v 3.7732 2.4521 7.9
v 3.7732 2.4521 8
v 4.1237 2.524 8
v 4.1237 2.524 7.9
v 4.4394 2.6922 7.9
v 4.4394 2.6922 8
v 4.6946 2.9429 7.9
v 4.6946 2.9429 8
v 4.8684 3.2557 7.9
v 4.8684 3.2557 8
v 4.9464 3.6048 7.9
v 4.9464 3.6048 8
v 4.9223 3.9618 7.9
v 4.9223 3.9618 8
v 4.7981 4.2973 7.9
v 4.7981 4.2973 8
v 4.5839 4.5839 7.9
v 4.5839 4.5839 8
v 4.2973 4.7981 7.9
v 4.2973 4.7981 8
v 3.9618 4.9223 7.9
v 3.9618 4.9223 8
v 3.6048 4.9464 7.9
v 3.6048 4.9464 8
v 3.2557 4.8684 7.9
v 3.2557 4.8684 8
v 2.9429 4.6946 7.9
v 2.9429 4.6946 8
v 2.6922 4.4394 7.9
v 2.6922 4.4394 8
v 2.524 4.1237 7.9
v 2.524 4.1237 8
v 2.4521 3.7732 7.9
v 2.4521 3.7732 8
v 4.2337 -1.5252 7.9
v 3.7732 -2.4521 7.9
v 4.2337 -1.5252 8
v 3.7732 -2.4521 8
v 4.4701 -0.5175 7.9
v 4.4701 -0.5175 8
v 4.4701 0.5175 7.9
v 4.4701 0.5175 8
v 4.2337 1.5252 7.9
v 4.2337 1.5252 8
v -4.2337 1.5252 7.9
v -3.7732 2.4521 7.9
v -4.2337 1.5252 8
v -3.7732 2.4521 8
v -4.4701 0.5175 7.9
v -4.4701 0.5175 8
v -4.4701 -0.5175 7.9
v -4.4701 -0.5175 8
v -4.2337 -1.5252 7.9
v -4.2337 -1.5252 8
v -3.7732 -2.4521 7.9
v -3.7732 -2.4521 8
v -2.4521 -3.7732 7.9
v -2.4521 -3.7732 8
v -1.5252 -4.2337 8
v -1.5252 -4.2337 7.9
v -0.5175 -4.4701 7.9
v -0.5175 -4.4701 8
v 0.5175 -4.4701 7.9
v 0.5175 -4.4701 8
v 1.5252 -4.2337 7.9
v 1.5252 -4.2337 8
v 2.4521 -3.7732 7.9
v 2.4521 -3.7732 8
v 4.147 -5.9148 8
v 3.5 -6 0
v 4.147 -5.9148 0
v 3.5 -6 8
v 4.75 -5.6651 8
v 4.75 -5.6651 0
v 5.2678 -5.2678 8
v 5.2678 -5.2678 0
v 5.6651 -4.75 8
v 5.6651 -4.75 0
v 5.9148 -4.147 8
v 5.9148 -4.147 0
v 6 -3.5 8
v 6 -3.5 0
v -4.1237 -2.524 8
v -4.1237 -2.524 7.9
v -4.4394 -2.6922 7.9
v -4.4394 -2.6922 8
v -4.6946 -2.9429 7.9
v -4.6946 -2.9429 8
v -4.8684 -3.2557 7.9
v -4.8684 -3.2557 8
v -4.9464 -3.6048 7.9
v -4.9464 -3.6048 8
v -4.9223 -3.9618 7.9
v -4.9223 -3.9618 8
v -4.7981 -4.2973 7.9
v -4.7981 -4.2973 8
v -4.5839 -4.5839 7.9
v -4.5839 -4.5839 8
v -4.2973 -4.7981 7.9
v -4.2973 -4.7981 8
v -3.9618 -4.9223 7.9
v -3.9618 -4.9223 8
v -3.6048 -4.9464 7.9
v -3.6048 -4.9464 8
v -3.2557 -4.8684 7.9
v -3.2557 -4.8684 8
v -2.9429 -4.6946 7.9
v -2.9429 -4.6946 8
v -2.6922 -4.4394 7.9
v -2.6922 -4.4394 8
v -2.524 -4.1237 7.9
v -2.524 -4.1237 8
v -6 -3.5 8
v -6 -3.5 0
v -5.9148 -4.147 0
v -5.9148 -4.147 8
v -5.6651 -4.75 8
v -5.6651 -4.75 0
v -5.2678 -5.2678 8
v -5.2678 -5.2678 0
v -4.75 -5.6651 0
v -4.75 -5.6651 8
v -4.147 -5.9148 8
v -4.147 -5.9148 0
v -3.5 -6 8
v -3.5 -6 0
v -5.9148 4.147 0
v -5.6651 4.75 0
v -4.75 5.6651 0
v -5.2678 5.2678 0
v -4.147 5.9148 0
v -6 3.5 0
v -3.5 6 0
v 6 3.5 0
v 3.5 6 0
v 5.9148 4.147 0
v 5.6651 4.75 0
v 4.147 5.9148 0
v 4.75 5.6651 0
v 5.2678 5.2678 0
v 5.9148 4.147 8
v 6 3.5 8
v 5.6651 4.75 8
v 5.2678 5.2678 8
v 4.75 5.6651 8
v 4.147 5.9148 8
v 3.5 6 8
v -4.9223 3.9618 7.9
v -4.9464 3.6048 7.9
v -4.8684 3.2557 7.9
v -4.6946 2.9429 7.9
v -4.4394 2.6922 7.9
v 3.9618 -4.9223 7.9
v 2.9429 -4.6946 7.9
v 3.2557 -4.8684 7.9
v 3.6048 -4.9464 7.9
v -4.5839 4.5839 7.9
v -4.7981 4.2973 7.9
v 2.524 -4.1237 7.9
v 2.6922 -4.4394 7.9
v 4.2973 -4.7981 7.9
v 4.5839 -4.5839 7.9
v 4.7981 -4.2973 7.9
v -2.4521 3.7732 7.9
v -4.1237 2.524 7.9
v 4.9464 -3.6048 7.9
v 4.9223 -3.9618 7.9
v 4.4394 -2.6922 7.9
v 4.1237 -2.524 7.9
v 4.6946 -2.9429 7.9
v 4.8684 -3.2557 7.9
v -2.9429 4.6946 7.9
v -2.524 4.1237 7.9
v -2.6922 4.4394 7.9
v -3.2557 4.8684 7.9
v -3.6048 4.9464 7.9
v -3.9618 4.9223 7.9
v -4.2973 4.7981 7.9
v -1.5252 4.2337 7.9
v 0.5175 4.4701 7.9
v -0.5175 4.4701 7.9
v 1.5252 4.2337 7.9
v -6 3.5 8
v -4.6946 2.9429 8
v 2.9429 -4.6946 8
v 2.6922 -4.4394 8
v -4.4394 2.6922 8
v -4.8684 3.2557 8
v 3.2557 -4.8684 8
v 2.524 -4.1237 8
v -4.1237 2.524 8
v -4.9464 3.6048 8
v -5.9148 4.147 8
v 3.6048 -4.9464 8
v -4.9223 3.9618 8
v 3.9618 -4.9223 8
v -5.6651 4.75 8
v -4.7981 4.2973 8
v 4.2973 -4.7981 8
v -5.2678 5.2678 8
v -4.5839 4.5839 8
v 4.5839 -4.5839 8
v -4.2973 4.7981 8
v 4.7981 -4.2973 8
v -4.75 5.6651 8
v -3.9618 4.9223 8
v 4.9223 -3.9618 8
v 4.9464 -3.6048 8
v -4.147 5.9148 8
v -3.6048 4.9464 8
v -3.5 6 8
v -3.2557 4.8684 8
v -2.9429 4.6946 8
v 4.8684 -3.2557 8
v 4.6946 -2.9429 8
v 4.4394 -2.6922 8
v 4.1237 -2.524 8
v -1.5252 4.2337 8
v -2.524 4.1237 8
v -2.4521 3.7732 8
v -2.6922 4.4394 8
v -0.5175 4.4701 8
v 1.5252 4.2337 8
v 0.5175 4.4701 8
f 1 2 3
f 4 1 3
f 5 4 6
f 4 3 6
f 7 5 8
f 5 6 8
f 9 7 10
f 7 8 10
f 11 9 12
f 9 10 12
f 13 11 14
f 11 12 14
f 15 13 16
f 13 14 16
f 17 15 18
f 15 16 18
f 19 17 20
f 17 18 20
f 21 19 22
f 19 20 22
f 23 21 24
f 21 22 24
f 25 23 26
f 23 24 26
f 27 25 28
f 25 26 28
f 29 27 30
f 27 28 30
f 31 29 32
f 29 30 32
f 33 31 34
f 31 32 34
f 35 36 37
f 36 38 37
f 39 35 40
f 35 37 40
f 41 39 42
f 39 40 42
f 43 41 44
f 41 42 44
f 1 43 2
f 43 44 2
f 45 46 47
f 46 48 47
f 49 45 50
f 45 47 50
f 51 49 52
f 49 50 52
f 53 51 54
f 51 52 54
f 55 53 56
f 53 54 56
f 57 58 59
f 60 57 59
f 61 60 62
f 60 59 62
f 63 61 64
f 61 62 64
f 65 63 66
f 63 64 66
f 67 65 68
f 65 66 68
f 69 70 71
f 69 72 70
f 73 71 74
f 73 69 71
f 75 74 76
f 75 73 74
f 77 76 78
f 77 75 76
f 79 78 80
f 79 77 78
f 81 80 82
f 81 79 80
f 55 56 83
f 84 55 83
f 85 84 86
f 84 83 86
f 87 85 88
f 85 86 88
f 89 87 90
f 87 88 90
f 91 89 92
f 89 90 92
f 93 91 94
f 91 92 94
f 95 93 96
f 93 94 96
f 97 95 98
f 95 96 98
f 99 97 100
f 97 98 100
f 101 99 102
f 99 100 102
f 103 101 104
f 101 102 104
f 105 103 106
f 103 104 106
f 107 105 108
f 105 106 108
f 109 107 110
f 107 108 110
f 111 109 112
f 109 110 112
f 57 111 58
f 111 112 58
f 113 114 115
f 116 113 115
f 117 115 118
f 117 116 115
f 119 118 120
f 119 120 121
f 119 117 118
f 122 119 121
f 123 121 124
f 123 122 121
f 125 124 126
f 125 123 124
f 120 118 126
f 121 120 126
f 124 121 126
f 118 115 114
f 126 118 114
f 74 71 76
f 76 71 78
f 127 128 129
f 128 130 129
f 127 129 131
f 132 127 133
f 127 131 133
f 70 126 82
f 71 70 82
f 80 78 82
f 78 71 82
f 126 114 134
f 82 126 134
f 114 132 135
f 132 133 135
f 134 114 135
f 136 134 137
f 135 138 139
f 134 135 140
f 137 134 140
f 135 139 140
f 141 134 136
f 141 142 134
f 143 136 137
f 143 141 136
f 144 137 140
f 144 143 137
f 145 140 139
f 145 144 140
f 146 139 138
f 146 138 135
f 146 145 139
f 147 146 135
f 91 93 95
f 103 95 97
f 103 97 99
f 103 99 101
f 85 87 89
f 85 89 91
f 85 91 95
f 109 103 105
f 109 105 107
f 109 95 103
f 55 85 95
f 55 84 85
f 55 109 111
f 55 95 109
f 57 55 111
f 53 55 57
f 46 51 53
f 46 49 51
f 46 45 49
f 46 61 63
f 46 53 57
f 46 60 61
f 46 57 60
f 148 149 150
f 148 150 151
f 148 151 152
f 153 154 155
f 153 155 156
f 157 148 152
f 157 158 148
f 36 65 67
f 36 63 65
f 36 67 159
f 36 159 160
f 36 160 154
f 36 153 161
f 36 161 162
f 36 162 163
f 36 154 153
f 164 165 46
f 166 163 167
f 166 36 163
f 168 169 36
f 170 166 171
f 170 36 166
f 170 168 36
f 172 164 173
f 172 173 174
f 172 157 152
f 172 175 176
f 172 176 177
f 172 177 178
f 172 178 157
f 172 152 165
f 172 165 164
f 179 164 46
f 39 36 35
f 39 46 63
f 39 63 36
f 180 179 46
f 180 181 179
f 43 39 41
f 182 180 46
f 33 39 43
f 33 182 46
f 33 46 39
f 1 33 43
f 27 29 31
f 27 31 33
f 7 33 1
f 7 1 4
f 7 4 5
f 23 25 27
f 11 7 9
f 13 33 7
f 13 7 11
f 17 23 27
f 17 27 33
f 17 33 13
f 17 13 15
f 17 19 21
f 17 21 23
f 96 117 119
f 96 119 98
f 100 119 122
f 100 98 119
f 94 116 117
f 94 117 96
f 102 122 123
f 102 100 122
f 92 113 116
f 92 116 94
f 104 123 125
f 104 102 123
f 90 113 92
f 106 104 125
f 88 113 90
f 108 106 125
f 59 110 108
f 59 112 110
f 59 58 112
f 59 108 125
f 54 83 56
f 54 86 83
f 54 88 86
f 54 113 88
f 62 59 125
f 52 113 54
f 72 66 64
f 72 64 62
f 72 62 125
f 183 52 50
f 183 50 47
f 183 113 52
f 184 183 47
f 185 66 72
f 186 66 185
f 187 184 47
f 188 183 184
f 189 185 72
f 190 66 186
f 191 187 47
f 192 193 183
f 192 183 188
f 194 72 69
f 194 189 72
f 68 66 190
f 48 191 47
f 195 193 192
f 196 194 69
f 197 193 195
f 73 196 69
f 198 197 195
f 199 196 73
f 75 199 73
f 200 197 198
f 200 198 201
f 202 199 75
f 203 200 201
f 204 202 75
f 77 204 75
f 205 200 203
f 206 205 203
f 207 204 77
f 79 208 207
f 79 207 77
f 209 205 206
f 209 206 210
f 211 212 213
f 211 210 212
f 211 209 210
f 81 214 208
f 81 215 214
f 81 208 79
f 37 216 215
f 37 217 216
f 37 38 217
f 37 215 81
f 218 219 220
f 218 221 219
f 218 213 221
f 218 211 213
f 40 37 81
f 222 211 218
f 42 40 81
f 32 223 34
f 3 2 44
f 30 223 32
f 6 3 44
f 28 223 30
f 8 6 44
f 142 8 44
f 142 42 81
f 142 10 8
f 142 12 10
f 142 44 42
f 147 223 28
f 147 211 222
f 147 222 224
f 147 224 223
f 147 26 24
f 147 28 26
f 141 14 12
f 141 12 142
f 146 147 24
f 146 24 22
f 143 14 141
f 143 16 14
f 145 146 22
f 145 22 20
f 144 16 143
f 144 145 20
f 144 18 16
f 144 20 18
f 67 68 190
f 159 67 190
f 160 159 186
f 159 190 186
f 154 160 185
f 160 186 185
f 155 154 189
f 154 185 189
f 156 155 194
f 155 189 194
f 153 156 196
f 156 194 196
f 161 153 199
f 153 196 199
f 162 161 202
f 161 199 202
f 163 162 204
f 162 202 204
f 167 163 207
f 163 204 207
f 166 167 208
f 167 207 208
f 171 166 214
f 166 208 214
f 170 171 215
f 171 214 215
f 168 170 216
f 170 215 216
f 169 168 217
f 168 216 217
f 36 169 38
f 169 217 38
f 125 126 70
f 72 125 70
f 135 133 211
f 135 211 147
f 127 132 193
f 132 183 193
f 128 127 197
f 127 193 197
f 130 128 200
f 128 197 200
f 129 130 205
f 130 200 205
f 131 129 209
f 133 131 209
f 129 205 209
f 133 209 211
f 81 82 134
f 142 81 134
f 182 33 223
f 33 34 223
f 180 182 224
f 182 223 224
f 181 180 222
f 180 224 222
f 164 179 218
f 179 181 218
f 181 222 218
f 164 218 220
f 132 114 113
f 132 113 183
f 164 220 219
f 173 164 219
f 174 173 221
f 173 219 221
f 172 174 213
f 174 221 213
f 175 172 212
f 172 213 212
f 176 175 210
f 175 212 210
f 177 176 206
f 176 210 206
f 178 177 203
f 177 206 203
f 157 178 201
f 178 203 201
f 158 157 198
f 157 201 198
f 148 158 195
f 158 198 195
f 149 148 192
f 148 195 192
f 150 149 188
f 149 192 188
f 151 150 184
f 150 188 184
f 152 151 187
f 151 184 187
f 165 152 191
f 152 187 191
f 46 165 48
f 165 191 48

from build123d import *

# Parameters (mm, degrees)
SKETCH_1_W               = 12
SKETCH_1_H               = 12
EXTRUDE_1_DEPTH          = 8
FILLET_1_R               = 2.5
SKETCH_2_R               = 4.5
CUT_EXTRUDE_1_DEPTH      = 0.1
SKETCH_3_R               = 1.25
CUT_EXTRUDE_2_DEPTH      = 0.1
PATTERN_CIRCULAR_1_COUNT = 4


with BuildPart() as part:
    # Эскиз1 → Бобышка-Вытянуть1 (new body)
    with BuildSketch(Plane.XY):
        Rectangle(SKETCH_1_W, SKETCH_1_H)
    extrude(amount=EXTRUDE_1_DEPTH)

    # Скругление1
    fillet_1_edges = [part.edges().sort_by_distance(p)[0] for p in [
        (-6, 6, 4),
        (6, 6, 4),
        (-6, -6, 4),
        (6, -6, 4),
    ]]
    fillet(fillet_1_edges, radius=FILLET_1_R)

    # Эскиз2 → Вырез-Вытянуть1 (cut)
    with BuildSketch(Plane.XY.offset(8)):
        Circle(SKETCH_2_R)
    extrude(amount=-CUT_EXTRUDE_1_DEPTH, mode=Mode.SUBTRACT)

    # Эскиз3 → Вырез-Вытянуть2 (cut)
    with BuildSketch(Plane.XY.offset(8)):
        with Locations((-3.7, -3.7)):
            Circle(SKETCH_3_R)
    cut_extrude_2 = extrude(amount=-CUT_EXTRUDE_2_DEPTH, mode=Mode.SUBTRACT)

    # Круговой массив1: Вырез-Вытянуть2 ×4 about axis
    pattern_circular_1_axis = Axis((0, 0, -0.4), (0, 0, 1))
    for i in range(1, PATTERN_CIRCULAR_1_COUNT):
        add(cut_extrude_2.rotate(pattern_circular_1_axis, i * 360 / PATTERN_CIRCULAR_1_COUNT), mode=Mode.SUBTRACT)


solid = part.part
